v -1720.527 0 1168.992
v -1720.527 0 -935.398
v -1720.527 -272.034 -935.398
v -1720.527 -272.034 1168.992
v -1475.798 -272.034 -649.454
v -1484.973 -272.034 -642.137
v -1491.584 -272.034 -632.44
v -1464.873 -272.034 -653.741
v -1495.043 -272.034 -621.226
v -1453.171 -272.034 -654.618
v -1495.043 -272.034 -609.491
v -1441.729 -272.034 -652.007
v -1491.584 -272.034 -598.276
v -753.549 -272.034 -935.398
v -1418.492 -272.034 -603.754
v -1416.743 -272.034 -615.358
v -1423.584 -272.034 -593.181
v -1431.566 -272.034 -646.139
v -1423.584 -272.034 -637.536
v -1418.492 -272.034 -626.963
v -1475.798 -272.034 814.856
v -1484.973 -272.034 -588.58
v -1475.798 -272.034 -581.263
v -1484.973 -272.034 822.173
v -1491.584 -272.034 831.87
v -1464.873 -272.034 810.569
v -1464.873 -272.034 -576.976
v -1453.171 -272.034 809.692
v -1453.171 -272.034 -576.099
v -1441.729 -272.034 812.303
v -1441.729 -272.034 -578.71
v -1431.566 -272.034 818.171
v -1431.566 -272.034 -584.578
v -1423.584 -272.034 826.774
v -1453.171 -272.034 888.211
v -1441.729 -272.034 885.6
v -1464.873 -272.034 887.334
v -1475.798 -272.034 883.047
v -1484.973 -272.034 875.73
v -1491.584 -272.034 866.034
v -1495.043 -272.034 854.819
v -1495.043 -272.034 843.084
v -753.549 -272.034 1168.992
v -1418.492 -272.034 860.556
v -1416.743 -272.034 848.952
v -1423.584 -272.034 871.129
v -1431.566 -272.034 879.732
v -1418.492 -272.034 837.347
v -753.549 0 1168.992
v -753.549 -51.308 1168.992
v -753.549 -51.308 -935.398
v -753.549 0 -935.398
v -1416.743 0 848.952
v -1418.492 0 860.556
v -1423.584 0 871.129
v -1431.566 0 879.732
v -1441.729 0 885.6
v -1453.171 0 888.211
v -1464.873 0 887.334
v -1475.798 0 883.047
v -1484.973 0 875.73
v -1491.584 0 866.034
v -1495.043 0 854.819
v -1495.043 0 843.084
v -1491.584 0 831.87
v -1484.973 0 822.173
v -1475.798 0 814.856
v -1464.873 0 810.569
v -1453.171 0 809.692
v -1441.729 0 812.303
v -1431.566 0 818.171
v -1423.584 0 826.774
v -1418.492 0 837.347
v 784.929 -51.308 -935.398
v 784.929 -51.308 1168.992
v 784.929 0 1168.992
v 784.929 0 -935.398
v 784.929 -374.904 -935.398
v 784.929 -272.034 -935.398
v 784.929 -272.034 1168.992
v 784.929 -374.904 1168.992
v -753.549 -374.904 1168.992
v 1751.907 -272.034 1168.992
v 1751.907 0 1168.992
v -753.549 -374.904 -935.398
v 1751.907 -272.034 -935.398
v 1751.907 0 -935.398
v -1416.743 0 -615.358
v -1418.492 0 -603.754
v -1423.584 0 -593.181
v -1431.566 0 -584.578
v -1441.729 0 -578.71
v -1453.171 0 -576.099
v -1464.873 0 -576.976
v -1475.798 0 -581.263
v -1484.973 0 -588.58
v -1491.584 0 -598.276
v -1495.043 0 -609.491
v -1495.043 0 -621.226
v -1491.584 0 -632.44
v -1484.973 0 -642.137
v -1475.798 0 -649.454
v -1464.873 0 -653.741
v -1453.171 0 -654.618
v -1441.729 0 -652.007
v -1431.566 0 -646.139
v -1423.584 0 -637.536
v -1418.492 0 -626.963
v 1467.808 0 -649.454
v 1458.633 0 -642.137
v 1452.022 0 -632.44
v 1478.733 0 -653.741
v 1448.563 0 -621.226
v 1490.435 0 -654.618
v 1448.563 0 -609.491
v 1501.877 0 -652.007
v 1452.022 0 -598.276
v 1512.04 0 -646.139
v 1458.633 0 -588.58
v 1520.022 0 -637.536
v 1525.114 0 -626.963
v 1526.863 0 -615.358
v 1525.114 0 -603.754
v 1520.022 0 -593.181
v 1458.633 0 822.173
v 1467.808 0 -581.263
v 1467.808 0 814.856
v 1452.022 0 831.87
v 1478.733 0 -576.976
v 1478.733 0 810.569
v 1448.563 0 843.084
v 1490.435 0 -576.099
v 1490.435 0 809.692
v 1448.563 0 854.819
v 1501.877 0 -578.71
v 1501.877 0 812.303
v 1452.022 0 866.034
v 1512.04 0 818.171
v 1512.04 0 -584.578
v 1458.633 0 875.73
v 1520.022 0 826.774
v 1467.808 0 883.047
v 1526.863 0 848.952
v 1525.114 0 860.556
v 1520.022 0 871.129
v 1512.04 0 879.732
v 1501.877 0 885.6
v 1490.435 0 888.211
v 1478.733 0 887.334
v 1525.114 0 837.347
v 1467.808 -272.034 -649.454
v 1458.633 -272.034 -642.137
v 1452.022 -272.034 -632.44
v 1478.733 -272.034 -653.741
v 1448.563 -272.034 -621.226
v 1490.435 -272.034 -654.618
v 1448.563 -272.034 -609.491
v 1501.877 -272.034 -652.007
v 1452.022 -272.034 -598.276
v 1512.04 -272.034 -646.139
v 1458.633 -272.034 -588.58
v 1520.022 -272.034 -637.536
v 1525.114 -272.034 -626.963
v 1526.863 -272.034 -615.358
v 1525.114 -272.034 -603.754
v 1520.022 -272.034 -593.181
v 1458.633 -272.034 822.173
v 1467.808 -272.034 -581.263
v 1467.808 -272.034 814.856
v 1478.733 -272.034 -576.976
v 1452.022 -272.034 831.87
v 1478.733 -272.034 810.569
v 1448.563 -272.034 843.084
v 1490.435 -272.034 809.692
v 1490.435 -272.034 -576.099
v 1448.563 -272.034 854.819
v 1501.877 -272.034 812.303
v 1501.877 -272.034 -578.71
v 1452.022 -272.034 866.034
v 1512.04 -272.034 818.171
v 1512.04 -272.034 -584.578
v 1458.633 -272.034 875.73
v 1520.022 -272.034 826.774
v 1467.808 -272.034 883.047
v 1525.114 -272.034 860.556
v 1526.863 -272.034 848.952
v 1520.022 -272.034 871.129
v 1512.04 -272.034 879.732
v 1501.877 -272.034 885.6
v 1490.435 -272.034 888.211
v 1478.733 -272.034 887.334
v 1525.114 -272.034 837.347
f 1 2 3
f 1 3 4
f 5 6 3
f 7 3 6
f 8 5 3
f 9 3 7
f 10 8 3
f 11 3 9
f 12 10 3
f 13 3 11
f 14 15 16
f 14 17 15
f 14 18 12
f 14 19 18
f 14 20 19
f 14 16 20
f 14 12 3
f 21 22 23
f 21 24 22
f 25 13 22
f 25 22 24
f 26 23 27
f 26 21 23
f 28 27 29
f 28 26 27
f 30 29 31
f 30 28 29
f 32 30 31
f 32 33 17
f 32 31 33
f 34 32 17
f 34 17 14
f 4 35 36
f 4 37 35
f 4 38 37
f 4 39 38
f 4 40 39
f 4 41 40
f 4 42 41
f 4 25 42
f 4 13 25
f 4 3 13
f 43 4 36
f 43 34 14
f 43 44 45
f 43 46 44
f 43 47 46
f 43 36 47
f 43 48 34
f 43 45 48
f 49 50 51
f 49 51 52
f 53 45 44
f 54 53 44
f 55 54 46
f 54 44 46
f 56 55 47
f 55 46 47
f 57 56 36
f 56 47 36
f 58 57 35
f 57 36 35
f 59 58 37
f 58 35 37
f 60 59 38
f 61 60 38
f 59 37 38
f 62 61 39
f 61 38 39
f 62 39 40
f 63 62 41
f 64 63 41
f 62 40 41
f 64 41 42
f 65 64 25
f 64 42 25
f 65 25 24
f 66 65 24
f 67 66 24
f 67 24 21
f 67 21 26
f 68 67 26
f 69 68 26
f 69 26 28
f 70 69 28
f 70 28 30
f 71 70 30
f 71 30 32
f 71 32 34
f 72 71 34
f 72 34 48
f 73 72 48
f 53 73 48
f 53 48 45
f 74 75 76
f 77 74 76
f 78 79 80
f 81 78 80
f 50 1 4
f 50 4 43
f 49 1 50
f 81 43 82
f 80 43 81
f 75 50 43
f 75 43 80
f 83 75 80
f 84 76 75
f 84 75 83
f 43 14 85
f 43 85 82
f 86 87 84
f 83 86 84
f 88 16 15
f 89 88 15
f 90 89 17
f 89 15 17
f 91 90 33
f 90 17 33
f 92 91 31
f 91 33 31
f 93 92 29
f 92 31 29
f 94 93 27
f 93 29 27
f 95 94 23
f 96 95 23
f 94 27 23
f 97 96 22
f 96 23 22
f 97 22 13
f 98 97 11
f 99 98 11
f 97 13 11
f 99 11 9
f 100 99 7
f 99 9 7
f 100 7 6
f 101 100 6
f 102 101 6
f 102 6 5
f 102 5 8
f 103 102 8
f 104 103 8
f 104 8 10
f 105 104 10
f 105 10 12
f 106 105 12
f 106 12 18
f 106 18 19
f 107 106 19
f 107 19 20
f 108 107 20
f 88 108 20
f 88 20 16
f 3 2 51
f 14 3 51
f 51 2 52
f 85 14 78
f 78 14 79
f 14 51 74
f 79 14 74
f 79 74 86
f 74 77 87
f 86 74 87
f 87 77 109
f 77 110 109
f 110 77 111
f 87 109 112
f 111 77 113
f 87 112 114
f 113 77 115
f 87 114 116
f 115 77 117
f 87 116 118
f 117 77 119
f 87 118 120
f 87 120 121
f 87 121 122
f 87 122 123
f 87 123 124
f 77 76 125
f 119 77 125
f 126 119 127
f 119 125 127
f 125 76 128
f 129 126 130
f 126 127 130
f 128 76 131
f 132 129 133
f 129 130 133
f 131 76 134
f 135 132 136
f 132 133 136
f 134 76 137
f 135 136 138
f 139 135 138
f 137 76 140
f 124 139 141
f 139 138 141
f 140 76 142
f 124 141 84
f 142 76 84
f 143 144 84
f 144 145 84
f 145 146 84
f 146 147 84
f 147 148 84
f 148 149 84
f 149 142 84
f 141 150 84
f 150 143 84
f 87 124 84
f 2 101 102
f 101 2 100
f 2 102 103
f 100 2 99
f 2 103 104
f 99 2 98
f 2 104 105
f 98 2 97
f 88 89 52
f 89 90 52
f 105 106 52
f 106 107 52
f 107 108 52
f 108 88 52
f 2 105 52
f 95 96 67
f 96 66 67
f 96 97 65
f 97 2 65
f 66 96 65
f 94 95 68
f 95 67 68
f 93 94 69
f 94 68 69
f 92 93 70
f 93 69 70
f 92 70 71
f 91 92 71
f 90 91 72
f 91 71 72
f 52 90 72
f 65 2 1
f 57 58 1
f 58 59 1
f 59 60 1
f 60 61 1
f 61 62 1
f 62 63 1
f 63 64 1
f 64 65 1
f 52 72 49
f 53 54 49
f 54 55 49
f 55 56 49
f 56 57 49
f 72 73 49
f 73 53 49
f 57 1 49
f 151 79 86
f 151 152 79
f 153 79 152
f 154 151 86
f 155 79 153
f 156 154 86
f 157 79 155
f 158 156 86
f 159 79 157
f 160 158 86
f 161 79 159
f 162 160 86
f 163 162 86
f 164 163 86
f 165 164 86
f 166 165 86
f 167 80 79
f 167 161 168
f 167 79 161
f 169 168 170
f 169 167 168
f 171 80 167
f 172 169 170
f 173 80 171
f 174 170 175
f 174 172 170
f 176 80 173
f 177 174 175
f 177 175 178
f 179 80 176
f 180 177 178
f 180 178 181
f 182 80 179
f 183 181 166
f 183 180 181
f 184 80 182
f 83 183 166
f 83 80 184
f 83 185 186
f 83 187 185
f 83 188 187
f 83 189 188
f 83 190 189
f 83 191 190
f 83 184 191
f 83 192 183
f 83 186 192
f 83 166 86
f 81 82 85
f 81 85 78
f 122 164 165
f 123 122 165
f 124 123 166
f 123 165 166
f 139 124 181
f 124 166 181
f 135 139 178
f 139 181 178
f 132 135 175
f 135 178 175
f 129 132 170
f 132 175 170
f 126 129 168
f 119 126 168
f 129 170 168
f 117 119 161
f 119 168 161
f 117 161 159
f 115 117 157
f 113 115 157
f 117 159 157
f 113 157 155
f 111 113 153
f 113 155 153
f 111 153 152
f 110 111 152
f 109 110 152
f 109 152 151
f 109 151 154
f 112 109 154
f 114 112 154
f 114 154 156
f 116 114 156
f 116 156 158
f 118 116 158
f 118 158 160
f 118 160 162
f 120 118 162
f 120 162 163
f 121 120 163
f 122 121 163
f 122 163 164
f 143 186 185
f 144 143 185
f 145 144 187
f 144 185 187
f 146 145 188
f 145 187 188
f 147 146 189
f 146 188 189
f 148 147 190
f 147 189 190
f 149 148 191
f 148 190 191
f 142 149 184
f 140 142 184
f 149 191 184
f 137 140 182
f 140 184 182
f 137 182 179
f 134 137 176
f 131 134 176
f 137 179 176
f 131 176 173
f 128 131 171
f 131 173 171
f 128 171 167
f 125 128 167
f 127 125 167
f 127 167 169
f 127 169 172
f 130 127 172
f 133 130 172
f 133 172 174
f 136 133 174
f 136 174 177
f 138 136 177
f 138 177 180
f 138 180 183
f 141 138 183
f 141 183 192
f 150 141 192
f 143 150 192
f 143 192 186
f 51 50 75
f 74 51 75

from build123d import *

# Parameters (mm, degrees)
F0_W     = 3472.434
F0_H     = 2104.39
F1_DEPTH = 272.034
F2_W     = 1538.478
F2_H     = 2104.39
F3_DEPTH = 102.87
F4_W     = 1538.478
F4_H     = 51.308
F5_DEPTH = 2104.391
F6_R     = 39.37
F7_DEPTH = 272.035


with BuildPart() as f1:
    # F0 (on Front) → F1 (new body)
    with BuildSketch(Plane.XZ):
        with Locations((15.690273, 116.796543)):
            Rectangle(F0_W, F0_H)
    extrude(amount=F1_DEPTH)

    # F2 (on face) → F3 (join)
    with BuildSketch(Plane.XZ.offset(272.034)):
        with Locations((15.690273, 116.796543)):
            Rectangle(F2_W, F2_H)
    extrude(amount=F3_DEPTH)

    # F4 (on face) → F5 (cut, through all)
    with BuildSketch(Plane.XY.offset(1168.991543)):
        with Locations((15.690273, -25.654)):
            Rectangle(F4_W, F4_H)
    extrude(amount=-F5_DEPTH, mode=Mode.SUBTRACT)

    # F6 (on face) → F7 (cut, through all)
    with BuildSketch(Plane.XZ.offset(272.034)):
        with Locations((-1456.112727, 848.951543)):
            Circle(F6_R)
        with Locations((-1456.112727, -615.358457)):
            Circle(F6_R)
        with Locations((1487.493273, 848.951543)):
            Circle(F6_R)
        with Locations((1487.493273, -615.358457)):
            Circle(F6_R)
    extrude(amount=-F7_DEPTH, mode=Mode.SUBTRACT)


solid = f1.part
